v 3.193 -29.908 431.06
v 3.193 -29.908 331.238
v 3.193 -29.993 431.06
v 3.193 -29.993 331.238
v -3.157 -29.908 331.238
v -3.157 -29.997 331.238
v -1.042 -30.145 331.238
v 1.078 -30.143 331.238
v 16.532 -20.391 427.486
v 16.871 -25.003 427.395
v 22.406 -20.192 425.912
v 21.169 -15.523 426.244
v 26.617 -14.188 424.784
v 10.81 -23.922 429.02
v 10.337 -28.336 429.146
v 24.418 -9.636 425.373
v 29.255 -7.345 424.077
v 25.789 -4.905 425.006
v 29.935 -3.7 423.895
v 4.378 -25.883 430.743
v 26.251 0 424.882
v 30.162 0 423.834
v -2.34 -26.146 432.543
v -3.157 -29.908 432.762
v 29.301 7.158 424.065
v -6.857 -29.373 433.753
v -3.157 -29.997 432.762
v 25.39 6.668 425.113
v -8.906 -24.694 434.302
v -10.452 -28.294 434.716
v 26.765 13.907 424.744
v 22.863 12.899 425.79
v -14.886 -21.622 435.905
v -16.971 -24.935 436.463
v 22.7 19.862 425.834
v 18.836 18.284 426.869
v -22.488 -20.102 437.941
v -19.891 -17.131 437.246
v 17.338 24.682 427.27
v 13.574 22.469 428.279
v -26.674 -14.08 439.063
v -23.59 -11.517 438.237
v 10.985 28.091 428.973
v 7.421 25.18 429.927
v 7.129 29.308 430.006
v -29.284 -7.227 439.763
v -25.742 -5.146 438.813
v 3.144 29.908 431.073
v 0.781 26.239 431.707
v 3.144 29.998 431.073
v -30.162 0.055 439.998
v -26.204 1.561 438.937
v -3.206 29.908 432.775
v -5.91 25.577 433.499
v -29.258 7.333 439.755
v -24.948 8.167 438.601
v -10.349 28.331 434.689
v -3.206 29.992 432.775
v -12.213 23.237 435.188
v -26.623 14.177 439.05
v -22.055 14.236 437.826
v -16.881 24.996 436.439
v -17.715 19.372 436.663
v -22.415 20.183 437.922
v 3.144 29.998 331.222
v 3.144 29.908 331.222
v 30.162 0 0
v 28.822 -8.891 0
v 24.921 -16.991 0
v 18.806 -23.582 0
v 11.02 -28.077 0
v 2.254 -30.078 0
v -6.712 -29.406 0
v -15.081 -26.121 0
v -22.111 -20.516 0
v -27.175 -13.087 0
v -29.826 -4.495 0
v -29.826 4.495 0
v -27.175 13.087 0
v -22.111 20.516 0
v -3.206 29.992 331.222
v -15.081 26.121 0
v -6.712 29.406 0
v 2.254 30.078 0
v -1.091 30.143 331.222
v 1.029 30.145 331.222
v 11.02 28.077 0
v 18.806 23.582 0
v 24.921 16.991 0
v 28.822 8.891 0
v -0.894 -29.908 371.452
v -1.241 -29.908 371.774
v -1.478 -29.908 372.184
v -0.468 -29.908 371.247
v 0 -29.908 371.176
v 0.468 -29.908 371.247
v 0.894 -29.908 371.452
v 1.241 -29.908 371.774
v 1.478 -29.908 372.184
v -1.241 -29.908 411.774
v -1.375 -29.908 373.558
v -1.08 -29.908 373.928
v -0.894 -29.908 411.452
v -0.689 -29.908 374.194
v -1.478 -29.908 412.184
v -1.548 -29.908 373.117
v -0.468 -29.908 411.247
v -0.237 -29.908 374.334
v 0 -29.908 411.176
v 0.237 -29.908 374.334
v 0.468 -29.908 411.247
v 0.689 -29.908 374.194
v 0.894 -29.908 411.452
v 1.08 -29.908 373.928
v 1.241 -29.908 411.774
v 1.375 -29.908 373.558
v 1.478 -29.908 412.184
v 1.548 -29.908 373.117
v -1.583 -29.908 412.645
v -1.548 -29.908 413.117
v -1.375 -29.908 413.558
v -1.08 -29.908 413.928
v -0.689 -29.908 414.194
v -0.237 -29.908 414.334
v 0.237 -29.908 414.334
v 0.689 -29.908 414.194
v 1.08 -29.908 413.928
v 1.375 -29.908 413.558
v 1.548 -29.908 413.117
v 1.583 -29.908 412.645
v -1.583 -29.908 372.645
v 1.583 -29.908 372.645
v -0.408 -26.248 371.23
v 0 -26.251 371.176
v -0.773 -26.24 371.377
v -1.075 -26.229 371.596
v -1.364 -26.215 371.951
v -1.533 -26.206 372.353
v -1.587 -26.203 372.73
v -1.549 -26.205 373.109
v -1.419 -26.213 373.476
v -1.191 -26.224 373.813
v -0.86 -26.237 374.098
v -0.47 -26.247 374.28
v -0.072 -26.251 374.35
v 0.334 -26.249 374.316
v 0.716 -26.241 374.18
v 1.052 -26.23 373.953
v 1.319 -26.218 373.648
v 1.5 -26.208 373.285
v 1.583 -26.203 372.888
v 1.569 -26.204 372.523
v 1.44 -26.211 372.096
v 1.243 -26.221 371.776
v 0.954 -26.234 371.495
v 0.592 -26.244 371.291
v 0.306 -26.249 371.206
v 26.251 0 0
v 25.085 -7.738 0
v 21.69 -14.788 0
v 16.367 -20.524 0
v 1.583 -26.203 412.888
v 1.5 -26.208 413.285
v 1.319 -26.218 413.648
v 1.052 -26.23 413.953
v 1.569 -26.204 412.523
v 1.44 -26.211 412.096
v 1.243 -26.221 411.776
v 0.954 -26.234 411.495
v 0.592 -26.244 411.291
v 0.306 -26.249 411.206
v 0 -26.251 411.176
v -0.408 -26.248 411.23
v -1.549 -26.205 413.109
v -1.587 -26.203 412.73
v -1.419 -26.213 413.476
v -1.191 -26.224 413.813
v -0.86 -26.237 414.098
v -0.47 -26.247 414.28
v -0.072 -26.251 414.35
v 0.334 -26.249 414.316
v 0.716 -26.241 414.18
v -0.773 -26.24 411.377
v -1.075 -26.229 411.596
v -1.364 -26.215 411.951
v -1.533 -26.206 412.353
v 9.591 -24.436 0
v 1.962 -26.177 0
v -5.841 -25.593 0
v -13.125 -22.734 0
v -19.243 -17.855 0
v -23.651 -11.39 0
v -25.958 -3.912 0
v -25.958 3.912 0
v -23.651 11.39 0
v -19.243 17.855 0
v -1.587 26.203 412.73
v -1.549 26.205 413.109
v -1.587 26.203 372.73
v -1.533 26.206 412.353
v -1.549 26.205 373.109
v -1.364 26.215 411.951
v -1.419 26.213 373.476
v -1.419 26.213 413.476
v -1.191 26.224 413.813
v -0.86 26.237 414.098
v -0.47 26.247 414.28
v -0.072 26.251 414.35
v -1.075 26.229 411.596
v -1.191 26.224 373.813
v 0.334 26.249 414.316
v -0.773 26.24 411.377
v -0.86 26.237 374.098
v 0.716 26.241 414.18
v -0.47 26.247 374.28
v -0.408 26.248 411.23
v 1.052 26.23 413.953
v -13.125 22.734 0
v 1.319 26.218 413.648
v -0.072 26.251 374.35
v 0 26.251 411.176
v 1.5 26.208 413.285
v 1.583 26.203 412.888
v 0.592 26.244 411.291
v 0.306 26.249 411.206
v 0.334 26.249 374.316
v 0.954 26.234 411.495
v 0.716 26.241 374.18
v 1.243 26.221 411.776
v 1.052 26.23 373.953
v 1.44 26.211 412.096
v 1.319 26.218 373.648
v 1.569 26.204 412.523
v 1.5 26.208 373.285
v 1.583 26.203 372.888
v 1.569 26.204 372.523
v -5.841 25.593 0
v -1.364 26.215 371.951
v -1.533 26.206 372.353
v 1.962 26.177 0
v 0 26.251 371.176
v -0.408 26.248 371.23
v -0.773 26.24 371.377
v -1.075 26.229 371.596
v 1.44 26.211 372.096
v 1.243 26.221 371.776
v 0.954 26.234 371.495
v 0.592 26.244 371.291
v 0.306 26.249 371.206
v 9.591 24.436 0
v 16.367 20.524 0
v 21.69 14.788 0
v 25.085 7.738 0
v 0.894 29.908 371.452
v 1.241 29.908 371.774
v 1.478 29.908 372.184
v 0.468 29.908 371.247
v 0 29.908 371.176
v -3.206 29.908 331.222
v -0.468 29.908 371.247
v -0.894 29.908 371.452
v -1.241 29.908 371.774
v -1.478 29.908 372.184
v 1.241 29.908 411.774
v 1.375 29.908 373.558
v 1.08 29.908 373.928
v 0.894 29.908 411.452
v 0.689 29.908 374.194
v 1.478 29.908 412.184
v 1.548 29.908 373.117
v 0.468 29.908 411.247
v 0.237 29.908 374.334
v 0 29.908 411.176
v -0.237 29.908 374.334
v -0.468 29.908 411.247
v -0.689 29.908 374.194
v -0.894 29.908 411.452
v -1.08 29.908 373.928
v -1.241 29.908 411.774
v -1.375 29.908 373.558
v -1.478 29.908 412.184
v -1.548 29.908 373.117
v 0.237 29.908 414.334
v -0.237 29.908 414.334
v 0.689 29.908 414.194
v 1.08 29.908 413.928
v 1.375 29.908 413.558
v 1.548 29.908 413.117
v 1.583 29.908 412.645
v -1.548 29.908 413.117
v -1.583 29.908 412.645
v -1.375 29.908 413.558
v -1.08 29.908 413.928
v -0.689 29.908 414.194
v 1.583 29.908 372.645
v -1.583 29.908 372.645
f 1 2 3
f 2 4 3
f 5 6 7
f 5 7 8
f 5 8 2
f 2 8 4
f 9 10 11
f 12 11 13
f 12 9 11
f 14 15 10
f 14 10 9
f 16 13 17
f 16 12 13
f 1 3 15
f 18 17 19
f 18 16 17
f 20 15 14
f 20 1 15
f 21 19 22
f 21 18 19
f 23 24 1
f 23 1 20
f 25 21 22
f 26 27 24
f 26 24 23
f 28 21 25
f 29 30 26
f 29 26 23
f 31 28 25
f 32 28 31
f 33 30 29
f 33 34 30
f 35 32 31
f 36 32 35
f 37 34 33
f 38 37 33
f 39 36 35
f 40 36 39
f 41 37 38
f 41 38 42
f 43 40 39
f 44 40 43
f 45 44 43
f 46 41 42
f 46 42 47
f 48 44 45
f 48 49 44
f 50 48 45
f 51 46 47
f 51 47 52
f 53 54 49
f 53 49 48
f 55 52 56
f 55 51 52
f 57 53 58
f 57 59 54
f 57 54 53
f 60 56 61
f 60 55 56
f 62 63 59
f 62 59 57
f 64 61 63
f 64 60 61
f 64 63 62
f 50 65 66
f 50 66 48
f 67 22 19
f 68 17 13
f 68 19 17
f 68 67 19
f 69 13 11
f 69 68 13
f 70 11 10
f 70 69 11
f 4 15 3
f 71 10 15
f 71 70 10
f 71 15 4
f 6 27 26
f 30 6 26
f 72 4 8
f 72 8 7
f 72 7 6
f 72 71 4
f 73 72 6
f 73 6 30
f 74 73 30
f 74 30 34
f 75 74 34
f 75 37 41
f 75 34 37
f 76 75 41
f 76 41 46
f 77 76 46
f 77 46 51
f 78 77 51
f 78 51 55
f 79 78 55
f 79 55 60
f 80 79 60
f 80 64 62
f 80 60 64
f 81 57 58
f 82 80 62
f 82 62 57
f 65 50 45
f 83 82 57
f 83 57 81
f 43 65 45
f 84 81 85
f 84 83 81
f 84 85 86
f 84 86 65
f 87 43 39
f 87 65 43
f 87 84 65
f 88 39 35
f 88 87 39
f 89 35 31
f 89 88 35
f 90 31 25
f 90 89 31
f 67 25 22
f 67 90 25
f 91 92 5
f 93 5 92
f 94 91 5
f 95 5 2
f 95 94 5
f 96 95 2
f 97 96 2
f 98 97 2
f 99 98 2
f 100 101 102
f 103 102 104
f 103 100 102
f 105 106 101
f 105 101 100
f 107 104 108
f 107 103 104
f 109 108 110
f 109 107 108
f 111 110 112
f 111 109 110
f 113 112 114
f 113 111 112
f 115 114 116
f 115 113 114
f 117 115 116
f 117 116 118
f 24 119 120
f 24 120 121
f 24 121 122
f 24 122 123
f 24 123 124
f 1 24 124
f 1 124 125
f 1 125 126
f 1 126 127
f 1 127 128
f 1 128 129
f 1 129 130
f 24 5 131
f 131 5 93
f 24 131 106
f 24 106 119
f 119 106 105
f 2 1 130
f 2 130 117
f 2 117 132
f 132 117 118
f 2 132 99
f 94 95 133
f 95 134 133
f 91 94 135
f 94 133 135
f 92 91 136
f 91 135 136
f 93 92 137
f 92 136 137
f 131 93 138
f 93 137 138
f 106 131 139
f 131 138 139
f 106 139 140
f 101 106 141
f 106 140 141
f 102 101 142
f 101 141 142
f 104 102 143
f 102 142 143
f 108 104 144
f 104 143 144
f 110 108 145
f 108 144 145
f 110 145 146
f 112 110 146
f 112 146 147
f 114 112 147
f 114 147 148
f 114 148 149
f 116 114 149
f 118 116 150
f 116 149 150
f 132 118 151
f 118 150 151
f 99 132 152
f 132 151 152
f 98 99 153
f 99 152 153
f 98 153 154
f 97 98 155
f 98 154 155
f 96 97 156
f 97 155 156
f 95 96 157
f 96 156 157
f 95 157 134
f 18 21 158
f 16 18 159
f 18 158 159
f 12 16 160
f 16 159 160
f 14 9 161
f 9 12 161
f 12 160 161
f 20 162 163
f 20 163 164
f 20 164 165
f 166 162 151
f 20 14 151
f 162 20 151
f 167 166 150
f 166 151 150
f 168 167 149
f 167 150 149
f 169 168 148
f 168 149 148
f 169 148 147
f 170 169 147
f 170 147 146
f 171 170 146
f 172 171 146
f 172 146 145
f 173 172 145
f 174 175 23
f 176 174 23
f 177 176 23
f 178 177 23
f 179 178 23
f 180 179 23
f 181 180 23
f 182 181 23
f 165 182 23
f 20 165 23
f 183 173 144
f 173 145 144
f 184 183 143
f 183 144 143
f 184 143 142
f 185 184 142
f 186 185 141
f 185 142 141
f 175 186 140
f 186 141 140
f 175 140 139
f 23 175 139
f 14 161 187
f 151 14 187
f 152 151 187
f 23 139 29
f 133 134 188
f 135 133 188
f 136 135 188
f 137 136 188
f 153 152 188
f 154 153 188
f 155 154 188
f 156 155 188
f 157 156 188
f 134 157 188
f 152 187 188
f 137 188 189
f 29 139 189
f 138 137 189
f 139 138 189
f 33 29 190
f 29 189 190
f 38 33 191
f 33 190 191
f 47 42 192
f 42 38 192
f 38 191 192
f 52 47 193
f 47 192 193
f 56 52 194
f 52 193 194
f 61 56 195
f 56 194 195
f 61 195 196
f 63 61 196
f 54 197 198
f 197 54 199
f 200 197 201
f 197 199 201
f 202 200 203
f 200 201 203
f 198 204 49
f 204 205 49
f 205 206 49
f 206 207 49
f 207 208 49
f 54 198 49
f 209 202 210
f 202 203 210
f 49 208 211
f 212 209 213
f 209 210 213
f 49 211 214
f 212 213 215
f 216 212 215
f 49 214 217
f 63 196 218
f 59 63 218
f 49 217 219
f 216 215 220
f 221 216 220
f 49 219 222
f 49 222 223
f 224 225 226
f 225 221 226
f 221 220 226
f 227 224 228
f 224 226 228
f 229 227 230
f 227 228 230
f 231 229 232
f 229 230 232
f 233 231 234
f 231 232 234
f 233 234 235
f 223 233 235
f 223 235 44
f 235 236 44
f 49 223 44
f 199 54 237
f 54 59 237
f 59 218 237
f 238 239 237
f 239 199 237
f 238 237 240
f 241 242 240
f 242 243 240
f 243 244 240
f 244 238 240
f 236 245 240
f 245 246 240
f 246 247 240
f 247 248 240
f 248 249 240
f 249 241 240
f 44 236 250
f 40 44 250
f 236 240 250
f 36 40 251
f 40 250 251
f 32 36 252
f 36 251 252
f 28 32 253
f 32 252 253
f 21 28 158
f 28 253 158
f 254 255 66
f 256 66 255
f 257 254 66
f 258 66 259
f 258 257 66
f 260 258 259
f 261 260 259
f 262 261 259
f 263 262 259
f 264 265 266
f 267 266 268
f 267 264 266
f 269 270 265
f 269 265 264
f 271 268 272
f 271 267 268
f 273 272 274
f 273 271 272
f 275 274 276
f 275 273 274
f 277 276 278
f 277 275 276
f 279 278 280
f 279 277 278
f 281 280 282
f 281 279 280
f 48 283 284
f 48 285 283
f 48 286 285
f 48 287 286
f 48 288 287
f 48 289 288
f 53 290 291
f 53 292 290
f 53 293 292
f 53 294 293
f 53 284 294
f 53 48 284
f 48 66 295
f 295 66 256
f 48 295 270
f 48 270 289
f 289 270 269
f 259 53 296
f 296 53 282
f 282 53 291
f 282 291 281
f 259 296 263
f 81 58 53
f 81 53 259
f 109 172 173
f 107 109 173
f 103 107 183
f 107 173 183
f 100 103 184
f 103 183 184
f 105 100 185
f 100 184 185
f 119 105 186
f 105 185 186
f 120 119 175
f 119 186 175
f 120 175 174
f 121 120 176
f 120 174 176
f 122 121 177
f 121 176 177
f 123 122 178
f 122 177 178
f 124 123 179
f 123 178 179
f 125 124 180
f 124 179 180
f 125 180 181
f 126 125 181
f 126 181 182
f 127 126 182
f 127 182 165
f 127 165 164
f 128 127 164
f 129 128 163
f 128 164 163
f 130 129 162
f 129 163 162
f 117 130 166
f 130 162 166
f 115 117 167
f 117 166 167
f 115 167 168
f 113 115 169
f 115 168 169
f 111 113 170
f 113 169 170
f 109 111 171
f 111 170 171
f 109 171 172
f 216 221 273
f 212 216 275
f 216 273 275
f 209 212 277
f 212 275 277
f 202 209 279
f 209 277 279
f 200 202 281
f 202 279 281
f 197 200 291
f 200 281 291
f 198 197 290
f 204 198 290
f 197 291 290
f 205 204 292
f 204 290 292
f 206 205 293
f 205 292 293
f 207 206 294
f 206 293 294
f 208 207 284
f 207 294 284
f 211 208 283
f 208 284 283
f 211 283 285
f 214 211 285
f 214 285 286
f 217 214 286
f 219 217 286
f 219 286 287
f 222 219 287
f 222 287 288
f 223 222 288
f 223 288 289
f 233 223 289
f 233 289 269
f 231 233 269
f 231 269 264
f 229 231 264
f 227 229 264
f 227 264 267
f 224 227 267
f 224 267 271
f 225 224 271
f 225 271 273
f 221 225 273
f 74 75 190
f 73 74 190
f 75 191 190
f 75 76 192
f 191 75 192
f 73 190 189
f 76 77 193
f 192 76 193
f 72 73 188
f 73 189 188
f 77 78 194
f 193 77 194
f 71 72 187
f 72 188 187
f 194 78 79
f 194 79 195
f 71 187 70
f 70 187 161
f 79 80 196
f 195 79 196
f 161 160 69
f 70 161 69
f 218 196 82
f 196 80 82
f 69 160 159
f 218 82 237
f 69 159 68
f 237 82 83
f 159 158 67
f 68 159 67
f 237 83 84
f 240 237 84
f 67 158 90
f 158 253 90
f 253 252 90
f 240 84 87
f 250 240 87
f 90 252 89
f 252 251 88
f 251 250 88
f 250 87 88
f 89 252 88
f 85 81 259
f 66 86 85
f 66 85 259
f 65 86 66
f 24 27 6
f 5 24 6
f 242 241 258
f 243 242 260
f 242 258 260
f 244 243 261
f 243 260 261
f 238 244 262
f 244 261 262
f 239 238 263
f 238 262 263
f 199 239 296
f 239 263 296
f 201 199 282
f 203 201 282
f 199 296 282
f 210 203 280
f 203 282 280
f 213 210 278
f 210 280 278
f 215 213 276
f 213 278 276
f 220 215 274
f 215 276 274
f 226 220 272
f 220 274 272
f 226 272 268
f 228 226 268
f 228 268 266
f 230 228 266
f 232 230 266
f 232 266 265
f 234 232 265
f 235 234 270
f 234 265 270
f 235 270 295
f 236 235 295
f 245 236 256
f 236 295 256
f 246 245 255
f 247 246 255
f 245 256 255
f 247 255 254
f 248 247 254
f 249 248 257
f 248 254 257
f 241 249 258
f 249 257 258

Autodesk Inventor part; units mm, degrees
sketch "Sketch1" plane through (0, 0, 0) normal (0, 0, 1) x (1, 0, 0)
  circle A0 centre (0, 0) radius 30.1625
  circle A1 centre (0, 0) radius 26.2509
  dimension "d0" = 60.325
  dimension "d2" = 3.9116
extrude "Extrusion1" add sketch "Sketch1" along normal blind 440
sketch "Sketch18" plane through (0, 0, 440) normal (0, 0, 1) x (1, 0, 0)
  circle A0 centre (0, 0) radius 26.2509 projected
  circle A1 centre (0, 0) radius 30.1625 projected
  point P0 (-30.1625, 0)
ref_plane "Work Plane9" through (-30.1625, 0, 440) normal (0.2588, 0, 0.9659) x (0, 1, 0)
sketch "Sketch19" plane through (-30.1625, 0, 440) normal (0.2588, 0, 0.9659) x (0, 1, 0)
  line L0 (-31.6137, -94.9476) -> (64.4261, -94.9476)
  line L1 (64.4261, -94.9476) -> (64.4261, 6.6524)
  line L2 (64.4261, 6.6524) -> (-31.6137, 6.6524)
  line L3 (-31.6137, 6.6524) -> (-31.6137, -94.9476)
  point P0 (0, -143.0151)
  dimension "d61" = 101.6
extrude "Extrusion11" cut sketch "Sketch19" along normal blind 25.4
sketch "Sketch20" plane through (0, 0, 0) normal (0, 0, -1) x (-1, 0, 0)
  circle A0 centre (0, 0) radius 26.2509 projected
  circle A1 centre (0, 0) radius 30.1625 projected
  point P0 (0, 30.1625)
  point P1 (0, -30.1625)
ref_plane "Work Plane10" through (0, 30.1625, 0) normal (0, 1, 0) x (-1, 0, 0)
ref_plane "Work Plane11" through (0, -30.1625, 0) normal (0, -1, 0) x (1, 0, 0)
sketch "Sketch21" plane through (0, 30.1625, 0) normal (0, 1, 0) x (-1, 0, 0)
  line L0 (-3.1444, 432.8221) -> (3.2056, 432.8221)
  line L1 (3.2056, 432.8221) -> (3.2056, 331.2221)
  line L2 (3.2056, 331.2221) -> (-3.1444, 331.2221)
  line L3 (-3.1444, 331.2221) -> (-3.1444, 432.8221)
  line L4 (0.0306, 432.8221) -> (0.0306, 331.2221) construction
  point P0 (0, 0)
  dimension "d64" = 6.35
  dimension "d65" = 101.6
extrude "flat1" cut sketch "Sketch21" against normal blind 0.254
sketch "Sketch22" plane through (0, -30.1625, 0) normal (0, -1, 0) x (1, 0, 0)
  line L0 (-3.1568, 331.2379) -> (3.1932, 331.2379)
  line L1 (3.1932, 331.2379) -> (3.1932, 432.8379)
  line L2 (3.1932, 432.8379) -> (-3.1568, 432.8379)
  line L3 (-3.1568, 432.8379) -> (-3.1568, 331.2379)
  line L4 (0.0182, 432.8379) -> (0.0182, 331.2379) construction
  point P0 (0, 0)
  dimension "d68" = 6.35
  dimension "d69" = 101.6
extrude "flat2" cut sketch "Sketch22" against normal blind 0.254
sketch "Sketch23" plane through (0, -29.9085, 0) normal (0, -1, 0) x (1, 0, 0)
  circle A0 centre (0, 412.7638) radius 1.4603
  circle A1 centre (0, 372.7638) radius 1.4603
  point P0 (-3.1568, 432.7638)
  point P1 (0, 0)
  dimension "d73" = 40
  dimension "d74" = 20
hole "Hole1" at (0, -29.9085, 412.7638) at (0, -29.9085, 372.7638) direction (0, 1, 0) diameter 3.175 end through all
properties part number "2r2scs" material "PVC-Piping"
